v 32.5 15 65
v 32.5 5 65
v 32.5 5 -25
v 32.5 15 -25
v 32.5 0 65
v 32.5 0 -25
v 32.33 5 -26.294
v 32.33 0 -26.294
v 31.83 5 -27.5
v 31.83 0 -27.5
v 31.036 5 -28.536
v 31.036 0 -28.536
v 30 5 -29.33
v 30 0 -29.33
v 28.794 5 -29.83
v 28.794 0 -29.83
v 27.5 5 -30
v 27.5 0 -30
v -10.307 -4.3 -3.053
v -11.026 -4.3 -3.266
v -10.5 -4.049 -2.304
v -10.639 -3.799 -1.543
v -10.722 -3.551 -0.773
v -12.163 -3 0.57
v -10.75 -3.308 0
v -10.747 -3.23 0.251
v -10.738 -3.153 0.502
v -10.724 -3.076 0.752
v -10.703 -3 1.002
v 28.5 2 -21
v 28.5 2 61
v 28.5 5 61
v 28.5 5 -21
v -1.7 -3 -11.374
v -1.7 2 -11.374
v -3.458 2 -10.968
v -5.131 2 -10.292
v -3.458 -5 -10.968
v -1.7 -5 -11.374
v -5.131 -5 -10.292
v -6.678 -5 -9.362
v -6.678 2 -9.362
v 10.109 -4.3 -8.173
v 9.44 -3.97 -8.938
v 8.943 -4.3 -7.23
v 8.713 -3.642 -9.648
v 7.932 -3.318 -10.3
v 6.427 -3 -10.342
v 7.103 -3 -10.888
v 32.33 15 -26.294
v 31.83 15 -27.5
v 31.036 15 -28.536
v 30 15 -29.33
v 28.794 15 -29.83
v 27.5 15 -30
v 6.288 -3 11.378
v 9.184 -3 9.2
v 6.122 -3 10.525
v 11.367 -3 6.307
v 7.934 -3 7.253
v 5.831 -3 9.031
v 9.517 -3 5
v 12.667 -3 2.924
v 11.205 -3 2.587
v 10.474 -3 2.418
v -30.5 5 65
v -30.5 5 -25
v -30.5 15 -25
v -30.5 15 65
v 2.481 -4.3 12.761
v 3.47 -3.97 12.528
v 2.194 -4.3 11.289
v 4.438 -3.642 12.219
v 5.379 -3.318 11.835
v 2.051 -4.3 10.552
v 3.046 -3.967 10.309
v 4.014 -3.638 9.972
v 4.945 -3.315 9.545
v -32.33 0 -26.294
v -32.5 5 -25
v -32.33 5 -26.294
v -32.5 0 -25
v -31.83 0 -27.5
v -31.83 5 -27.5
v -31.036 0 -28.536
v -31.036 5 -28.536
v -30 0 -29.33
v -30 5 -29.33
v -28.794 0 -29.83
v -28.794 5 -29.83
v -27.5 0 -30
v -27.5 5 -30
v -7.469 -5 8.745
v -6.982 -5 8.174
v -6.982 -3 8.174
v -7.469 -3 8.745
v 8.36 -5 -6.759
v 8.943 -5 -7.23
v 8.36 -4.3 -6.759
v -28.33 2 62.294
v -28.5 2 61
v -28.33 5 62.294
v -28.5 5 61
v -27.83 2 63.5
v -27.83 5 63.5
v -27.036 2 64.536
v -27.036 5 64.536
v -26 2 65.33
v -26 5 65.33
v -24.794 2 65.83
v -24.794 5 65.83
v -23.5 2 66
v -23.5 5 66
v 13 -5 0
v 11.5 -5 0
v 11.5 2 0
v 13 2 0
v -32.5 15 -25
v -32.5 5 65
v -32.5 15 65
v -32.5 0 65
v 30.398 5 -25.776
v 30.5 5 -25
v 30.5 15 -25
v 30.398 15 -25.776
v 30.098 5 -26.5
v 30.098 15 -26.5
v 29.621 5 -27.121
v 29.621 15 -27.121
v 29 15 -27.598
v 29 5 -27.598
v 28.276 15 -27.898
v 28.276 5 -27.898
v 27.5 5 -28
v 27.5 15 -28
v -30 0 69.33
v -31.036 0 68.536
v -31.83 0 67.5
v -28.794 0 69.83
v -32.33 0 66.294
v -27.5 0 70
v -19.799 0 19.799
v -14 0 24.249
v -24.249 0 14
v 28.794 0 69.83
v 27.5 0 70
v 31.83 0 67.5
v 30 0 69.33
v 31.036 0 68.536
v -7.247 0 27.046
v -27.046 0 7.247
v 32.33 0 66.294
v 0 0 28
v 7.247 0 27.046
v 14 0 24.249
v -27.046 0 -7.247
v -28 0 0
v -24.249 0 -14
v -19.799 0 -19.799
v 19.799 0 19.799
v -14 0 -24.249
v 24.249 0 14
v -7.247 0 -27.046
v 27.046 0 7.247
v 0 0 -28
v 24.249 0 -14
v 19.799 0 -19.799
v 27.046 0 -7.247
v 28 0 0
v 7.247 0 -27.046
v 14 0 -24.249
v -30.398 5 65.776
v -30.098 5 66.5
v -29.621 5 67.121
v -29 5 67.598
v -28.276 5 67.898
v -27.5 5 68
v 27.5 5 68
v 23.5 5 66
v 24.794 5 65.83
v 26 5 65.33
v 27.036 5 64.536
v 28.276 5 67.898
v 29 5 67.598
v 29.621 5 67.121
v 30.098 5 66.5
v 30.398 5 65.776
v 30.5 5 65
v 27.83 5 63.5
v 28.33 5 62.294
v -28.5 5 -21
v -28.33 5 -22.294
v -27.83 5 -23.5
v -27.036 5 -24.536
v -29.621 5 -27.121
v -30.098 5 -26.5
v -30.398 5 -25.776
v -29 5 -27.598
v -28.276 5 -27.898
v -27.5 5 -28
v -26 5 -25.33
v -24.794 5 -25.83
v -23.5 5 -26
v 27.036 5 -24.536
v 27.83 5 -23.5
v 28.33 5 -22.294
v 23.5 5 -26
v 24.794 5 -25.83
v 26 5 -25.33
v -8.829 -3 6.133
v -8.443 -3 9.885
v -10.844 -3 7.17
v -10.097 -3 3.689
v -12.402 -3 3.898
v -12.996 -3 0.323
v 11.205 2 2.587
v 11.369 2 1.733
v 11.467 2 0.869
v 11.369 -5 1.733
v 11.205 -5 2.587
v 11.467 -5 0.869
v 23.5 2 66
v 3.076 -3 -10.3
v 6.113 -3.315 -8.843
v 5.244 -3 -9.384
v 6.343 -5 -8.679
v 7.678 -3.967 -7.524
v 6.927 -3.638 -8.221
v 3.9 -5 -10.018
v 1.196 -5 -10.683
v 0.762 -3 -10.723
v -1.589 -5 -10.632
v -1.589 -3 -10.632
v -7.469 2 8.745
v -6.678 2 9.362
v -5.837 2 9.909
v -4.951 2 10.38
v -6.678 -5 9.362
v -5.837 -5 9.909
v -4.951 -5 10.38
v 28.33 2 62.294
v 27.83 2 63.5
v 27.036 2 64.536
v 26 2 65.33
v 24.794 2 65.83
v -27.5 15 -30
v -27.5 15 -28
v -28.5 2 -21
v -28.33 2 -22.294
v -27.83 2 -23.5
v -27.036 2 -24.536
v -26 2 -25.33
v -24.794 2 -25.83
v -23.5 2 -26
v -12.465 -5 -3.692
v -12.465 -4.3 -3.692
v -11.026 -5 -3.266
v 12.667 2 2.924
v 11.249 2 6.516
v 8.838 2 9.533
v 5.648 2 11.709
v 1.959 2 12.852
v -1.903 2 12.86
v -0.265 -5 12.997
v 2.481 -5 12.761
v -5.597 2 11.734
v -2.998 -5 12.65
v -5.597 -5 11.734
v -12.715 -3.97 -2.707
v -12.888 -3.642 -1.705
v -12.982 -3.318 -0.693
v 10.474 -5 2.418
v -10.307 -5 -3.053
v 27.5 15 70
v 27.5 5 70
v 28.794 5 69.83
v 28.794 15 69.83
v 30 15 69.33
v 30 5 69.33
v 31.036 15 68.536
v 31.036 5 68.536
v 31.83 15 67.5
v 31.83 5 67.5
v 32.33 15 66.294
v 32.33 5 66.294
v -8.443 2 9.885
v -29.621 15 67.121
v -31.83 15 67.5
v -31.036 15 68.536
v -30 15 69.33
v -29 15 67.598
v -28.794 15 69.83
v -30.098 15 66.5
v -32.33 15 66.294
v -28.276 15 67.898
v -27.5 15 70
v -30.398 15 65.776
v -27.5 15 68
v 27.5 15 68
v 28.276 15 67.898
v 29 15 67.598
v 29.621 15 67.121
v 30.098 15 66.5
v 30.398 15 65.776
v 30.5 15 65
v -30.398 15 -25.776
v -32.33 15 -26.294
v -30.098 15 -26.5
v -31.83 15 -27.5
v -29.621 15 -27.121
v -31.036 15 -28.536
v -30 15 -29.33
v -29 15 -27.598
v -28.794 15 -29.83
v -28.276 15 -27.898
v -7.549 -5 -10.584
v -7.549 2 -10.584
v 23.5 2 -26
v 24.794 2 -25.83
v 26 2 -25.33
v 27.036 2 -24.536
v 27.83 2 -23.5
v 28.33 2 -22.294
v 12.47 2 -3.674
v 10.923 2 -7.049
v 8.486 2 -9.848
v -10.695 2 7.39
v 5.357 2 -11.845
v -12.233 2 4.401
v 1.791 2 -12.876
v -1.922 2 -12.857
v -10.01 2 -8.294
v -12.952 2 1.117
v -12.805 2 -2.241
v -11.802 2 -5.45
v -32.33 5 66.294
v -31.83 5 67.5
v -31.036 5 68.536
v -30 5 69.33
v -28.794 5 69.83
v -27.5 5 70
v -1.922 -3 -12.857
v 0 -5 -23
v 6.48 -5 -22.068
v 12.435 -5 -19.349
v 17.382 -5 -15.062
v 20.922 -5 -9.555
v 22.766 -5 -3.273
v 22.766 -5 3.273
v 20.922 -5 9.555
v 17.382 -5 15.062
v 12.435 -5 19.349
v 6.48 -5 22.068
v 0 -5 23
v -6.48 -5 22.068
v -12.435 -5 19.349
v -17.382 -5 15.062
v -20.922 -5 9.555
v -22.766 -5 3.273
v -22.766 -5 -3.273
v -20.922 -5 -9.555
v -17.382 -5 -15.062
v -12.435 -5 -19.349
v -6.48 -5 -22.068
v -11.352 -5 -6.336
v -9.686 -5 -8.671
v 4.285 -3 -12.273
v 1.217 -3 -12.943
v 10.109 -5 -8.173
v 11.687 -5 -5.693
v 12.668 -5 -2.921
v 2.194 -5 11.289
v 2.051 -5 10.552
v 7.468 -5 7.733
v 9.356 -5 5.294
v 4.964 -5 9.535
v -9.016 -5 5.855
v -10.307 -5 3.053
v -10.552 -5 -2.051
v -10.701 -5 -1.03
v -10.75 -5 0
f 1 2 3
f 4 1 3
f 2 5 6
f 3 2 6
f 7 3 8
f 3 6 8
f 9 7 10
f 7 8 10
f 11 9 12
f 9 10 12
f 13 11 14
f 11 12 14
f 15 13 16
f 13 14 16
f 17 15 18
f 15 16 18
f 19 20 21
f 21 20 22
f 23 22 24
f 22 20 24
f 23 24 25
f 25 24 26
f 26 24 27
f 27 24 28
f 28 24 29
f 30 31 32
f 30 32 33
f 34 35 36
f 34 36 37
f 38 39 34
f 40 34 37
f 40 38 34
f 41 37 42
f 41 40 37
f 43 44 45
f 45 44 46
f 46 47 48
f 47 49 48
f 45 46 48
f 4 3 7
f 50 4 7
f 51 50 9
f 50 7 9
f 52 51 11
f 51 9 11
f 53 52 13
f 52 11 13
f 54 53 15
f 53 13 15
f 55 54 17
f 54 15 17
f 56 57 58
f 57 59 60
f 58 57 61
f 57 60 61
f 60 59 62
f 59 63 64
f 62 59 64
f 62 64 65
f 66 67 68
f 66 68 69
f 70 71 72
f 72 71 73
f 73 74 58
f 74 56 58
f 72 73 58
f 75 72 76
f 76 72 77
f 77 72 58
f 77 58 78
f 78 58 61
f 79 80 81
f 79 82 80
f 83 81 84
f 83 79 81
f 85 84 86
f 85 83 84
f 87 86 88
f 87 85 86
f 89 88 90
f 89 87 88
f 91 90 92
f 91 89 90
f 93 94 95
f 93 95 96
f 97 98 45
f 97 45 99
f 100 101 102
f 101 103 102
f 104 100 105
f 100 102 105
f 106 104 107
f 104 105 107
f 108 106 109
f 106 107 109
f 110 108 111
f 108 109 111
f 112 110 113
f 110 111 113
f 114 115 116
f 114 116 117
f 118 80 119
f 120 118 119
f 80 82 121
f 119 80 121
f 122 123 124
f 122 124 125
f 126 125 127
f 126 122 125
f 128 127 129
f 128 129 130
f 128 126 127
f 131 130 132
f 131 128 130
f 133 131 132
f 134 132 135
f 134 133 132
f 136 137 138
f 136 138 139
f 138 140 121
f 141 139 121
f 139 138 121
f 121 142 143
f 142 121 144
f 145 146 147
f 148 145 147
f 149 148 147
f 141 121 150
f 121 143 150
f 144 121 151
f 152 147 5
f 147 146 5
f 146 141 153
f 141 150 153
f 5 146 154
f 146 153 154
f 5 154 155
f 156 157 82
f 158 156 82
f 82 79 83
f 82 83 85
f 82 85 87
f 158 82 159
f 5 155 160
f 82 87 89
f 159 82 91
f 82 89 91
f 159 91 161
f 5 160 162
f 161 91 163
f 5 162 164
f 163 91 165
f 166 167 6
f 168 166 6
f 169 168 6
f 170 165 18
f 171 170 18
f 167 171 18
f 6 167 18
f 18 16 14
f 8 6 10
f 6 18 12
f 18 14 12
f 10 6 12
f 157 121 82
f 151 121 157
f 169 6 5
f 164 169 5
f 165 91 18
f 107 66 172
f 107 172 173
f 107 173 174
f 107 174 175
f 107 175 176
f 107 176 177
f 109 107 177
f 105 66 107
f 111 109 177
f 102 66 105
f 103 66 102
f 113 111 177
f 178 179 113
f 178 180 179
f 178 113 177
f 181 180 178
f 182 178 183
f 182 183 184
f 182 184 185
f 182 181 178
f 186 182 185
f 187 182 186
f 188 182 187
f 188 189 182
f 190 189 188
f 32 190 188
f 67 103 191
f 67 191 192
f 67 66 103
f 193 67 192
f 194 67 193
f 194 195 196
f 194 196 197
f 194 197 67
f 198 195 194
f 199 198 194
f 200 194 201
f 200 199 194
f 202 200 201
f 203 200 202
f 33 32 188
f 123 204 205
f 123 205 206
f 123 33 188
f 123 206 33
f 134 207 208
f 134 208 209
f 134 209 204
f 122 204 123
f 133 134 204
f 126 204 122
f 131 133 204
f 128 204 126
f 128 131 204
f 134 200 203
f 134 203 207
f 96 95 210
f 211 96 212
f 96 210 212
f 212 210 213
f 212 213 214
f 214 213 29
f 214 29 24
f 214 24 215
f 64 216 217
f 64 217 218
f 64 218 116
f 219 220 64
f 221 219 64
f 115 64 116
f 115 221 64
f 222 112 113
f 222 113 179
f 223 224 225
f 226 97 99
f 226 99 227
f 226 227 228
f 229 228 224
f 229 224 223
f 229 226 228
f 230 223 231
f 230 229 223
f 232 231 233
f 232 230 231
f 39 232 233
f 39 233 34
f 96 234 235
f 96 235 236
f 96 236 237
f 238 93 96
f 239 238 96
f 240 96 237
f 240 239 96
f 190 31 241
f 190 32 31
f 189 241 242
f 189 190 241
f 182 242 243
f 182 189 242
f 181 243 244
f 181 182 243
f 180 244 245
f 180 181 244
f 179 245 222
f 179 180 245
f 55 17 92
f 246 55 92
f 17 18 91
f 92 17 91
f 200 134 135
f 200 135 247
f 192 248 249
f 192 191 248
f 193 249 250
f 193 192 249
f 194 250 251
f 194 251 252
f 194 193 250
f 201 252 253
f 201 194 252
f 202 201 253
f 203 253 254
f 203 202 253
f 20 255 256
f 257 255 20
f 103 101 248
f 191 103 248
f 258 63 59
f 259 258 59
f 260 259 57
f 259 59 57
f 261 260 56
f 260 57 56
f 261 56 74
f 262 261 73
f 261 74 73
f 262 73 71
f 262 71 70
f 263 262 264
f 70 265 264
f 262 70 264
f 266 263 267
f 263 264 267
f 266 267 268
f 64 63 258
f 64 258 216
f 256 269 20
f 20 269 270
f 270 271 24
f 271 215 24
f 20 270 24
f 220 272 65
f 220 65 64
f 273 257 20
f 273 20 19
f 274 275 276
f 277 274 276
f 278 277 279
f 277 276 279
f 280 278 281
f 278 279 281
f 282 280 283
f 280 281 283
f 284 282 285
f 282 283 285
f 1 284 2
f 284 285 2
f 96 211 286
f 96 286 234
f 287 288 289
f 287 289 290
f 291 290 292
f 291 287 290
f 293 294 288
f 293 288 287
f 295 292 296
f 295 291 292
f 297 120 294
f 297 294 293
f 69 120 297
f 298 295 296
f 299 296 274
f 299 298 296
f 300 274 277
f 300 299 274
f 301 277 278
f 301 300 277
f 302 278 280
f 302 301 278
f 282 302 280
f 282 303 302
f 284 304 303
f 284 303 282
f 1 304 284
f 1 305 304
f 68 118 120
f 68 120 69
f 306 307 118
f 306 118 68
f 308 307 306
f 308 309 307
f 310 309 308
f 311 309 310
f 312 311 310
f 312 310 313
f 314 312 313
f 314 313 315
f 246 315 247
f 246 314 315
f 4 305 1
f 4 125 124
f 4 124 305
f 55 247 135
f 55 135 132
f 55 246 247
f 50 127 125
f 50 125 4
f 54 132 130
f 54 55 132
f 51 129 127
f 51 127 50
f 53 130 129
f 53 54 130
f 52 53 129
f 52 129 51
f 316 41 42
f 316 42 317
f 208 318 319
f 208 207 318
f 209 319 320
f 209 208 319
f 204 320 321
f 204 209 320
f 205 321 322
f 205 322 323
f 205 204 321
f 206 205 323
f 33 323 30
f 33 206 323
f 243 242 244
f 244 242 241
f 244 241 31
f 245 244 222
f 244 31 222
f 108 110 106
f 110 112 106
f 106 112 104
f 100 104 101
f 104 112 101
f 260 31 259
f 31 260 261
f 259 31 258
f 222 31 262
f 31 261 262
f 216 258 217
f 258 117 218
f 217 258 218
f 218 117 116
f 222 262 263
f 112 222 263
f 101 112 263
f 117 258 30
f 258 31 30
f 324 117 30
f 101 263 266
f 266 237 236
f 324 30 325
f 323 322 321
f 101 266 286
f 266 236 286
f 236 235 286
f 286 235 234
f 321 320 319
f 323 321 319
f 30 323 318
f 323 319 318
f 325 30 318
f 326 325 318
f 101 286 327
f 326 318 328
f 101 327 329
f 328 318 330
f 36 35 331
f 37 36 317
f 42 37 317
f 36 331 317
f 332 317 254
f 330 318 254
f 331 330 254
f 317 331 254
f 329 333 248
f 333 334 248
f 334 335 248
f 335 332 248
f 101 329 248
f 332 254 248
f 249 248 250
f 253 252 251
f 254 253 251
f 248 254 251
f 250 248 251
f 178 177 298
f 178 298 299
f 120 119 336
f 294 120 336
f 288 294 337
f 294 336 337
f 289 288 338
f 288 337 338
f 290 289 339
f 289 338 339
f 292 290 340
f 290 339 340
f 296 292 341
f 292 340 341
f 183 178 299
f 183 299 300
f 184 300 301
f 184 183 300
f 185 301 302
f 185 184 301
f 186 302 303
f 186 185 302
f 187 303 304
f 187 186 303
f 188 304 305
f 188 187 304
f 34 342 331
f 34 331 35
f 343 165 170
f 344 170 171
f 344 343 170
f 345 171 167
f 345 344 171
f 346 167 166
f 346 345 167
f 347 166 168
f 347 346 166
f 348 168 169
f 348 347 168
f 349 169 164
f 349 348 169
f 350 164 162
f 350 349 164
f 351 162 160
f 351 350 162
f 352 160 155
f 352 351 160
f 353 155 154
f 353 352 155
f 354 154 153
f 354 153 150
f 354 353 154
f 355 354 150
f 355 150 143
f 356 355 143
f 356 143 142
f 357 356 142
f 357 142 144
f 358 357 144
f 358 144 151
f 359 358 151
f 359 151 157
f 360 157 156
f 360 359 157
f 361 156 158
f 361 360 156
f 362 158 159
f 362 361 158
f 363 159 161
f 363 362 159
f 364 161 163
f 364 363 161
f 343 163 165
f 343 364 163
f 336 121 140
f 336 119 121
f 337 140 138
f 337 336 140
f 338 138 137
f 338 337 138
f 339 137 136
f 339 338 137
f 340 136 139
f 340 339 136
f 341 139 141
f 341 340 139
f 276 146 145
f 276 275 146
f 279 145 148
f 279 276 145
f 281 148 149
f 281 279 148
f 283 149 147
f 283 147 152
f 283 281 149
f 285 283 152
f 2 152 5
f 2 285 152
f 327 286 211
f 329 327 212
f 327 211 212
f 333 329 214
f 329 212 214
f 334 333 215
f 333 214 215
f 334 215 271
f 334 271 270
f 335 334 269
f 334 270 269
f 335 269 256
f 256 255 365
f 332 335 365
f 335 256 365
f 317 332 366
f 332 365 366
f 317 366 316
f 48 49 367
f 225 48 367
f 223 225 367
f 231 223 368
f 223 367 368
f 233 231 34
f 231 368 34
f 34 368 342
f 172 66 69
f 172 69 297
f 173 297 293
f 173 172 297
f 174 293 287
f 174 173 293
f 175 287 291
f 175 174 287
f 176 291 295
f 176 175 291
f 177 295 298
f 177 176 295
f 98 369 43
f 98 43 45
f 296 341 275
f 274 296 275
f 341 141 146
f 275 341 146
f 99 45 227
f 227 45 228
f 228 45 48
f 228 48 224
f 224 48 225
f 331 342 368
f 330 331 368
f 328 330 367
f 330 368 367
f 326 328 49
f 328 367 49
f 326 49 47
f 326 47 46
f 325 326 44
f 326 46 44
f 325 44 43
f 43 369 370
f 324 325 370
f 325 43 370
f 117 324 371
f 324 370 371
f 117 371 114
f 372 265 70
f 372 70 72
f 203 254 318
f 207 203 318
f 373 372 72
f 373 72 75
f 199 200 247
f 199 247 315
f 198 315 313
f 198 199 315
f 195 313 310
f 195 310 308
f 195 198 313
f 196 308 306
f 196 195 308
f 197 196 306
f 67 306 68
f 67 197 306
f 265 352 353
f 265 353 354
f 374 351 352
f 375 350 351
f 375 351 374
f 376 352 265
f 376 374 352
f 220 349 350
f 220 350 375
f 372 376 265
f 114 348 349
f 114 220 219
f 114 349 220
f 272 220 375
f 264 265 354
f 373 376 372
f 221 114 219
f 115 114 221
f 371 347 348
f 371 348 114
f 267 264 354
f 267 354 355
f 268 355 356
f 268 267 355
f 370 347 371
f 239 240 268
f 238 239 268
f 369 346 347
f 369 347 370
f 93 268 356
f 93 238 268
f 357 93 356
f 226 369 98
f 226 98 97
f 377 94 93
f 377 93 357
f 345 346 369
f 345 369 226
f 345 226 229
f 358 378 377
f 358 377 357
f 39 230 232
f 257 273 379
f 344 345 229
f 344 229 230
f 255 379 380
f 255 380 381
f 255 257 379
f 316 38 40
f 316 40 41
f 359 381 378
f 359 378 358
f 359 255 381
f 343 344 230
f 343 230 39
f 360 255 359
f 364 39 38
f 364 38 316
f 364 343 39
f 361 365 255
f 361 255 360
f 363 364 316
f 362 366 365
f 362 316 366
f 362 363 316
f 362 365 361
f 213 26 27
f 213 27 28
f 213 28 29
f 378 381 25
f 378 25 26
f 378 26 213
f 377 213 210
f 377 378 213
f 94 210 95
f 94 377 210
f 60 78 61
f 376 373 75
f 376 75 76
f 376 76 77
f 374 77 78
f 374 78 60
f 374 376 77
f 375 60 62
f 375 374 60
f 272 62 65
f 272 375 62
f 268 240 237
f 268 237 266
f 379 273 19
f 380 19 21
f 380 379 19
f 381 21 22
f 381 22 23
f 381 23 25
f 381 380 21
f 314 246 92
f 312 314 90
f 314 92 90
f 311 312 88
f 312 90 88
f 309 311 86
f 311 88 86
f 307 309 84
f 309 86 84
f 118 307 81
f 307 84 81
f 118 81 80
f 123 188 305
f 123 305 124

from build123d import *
from OCP.BRepFilletAPI import BRepFilletAPI_MakeChamfer

# Parameters (mm, degrees)
SKETCH1_W           = 65
SKETCH1_H           = 100
BOSS_EXTRUDE1_DEPTH = 2
SKETCH2_W           = 65
SKETCH2_H           = 100
SKETCH2_W_2         = 57
SKETCH2_H_2         = 92
BOSS_EXTRUDE2_DEPTH = 3
FILLET1_R           = 5
BOSS_EXTRUDE3_DEPTH = 10
SKETCH6_R           = 18
BOSS_EXTRUDE4_DEPTH = 5
CHAMFER1_SIZE       = 10
SKETCH7_R           = 13
CUT_EXTRUDE1_DEPTH  = 80.726093596
BOSS_EXTRUDE6_DEPTH = 2
BOSS_EXTRUDE7_DEPTH = 7
CHAMFER2_SIZE       = 1.3
CHAMFER2_SIZE2      = 4.000988598


with BuildPart() as part:
    # Sketch1 → Boss-Extrude1 (new body)
    with BuildSketch(Plane(origin=(0, 0, 0), x_dir=(1, 0, 0), z_dir=(0, 1, 0))):
        with Locations((0, -20)):
            Rectangle(SKETCH1_W, SKETCH1_H)
    extrude(amount=BOSS_EXTRUDE1_DEPTH)

    # Sketch2 → Boss-Extrude2 (add)
    with BuildSketch(Plane(origin=(0, 2, 0), x_dir=(1, 0, 0), z_dir=(0, 1, 0))):
        with Locations((0, -20)):
            Rectangle(SKETCH2_W, SKETCH2_H)
        with Locations((0, -20)):
            Rectangle(SKETCH2_W_2, SKETCH2_H_2, mode=Mode.SUBTRACT)
    extrude(amount=BOSS_EXTRUDE2_DEPTH)

    # Fillet1
    fillet1_edges = [part.edges().sort_by_distance(p)[0] for p in [
        (-28.5, 3.5, 66),
        (28.5, 3.5, 66),
        (28.5, 3.5, -26),
        (-28.5, 3.5, -26),
        (-32.5, 2.5, -30),
        (32.5, 2.5, -30),
        (32.5, 2.5, 70),
        (-32.5, 2.5, 70),
    ]]
    fillet(fillet1_edges, radius=FILLET1_R)

    # Sketch4 → Boss-Extrude3 (add)
    with BuildSketch(Plane(origin=(0, 5, 0), x_dir=(1, 0, 0), z_dir=(0, 1, 0))):
        with BuildLine():
            Line((-32.5, 25), (-32.5, -65))
            ThreePointArc((-32.5, -65), (-31.035533906, -68.535533906), (-27.5, -70))
            Line((-27.5, -70), (27.5, -70))
            ThreePointArc((27.5, -70), (31.035533906, -68.535533906), (32.5, -65))
            Line((32.5, -65), (32.5, 25))
            ThreePointArc((32.5, 25), (31.035533906, 28.535533906), (27.5, 30))
            Line((27.5, 30), (-27.5, 30))
            ThreePointArc((-27.5, 30), (-31.035533906, 28.535533906), (-32.5, 25))
        make_face()
        with BuildLine():
            Line((-30.5, 25), (-30.5, -65))
            ThreePointArc((-30.5, -65), (-29.621320344, -67.121320344), (-27.5, -68))
            Line((-27.5, -68), (27.5, -68))
            ThreePointArc((27.5, -68), (29.621320344, -67.121320344), (30.5, -65))
            Line((30.5, -65), (30.5, 25))
            ThreePointArc((30.5, 25), (29.621320344, 27.121320344), (27.5, 28))
            Line((27.5, 28), (-27.5, 28))
            ThreePointArc((-27.5, 28), (-29.621320344, 27.121320344), (-30.5, 25))
        make_face(mode=Mode.SUBTRACT)
    extrude(amount=BOSS_EXTRUDE3_DEPTH)

    # Sketch6 → Boss-Extrude4 (add)
    with BuildSketch(Plane(origin=(0, -5, 0), x_dir=(-1, 0, 0), z_dir=(0, -1, 0))):
        with Locations(Location((0, 0, 0), (0, 0, 90))):
            Circle(SKETCH6_R)
    extrude(amount=-BOSS_EXTRUDE4_DEPTH)

    # Chamfer1
    # the kernel refuses this chamfer: 10 mm, written as the material it adds along each edge
    with BuildSketch(Plane(origin=(0, 0, 0), x_dir=(0, 0, -1), z_dir=(-1, 0, 0))) as chamfer1_piece_1_section:
        Polygon((18 + CHAMFER1_SIZE, 0), (18, CHAMFER1_SIZE), (18, 0), align=None)
    chamfer1_piece_1 = revolve(axis=Axis((0, 0, 0), (0, -1, 0)), mode=Mode.PRIVATE)
    chamfer1_piece_1 = split(chamfer1_piece_1, bisect_by=Plane(origin=(0, -5, 25.515578953), z_dir=(0, 1, 0)), keep=Keep.TOP, mode=Mode.PRIVATE)
    add(chamfer1_piece_1)

    # Sketch7 → Cut-Extrude1 (cut, through all)
    with BuildSketch(Plane.XZ.offset(5)):
        with Locations(Location((0, 0, 0), (0, 0, 270))):
            Circle(SKETCH7_R)
    extrude(amount=-CUT_EXTRUDE1_DEPTH, mode=Mode.SUBTRACT)

    # Sketch8 → Boss-Extrude6 (add)
    with BuildSketch(Plane(origin=(0, -5, 0), x_dir=(-1, 0, 0), z_dir=(0, -1, 0))):
        with BuildLine():
            ThreePointArc((-8.942785339, 7.230255208), (-4.172190868, 10.71647439), (1.699808228, 11.373682429))
            Line((1.699808228, 11.373682429), (1.921522345, 12.857206224))
            ThreePointArc((1.921522345, 12.857206224), (-4.716389677, 12.114275398), (-10.109235601, 8.173331975))
            Line((-10.109235601, 8.173331975), (-8.942785339, 7.230255208))
        make_face()
        with BuildLine():
            Line((1.921522345, 12.857206224), (1.699808228, 11.373682429))
            ThreePointArc((1.699808228, 11.373682429), (4.307975824, 10.662614328), (6.678083991, 9.362328461))
            Line((6.678083991, 9.362328461), (7.549138424, 10.583501739))
            ThreePointArc((7.549138424, 10.583501739), (4.869885714, 12.053390109), (1.921522345, 12.857206224))
        make_face()
        with BuildLine():
            Line((12.464656553, 3.692199481), (11.026426951, 3.266176464))
            ThreePointArc((11.026426951, 3.266176464), (11.380990948, 1.650165153), (11.5, 0))
            ThreePointArc((11.5, 0), (10.443646499, -4.814586982), (7.468652556, -8.744668604))
            Line((7.468652556, -8.744668604), (8.442824628, -9.885277553))
            ThreePointArc((8.442824628, -9.885277553), (11.80586126, -5.442576588), (13, 0))
            ThreePointArc((13, 0), (12.865468029, 1.865404086), (12.464656553, 3.692199481))
        make_face()
        with BuildLine():
            ThreePointArc((7.468652556, -8.744668604), (6.263348903, -9.644711531), (4.950877613, -10.37973077))
            Line((4.950877613, -10.37973077), (5.596644259, -11.733608697))
            ThreePointArc((5.596644259, -11.733608697), (7.080307455, -10.902717383), (8.442824628, -9.885277553))
            Line((8.442824628, -9.885277553), (7.468652556, -8.744668604))
        make_face()
        with BuildLine():
            ThreePointArc((-8.359560208, 6.758716825), (-3.900091464, 10.017573887), (1.58895117, 10.631920531))
            Line((1.58895117, 10.631920531), (1.699808228, 11.373682429))
            ThreePointArc((1.699808228, 11.373682429), (-4.172190868, 10.71647439), (-8.942785339, 7.230255208))
            Line((-8.942785339, 7.230255208), (-8.359560208, 6.758716825))
        make_face()
        with BuildLine():
            Line((11.026426951, 3.266176464), (10.30731215, 3.053164956))
            ThreePointArc((10.30731215, 3.053164956), (10.638752408, 1.542545686), (10.75, 0))
            ThreePointArc((10.75, 0), (9.762539119, -4.500592179), (6.98156652, -8.17436413))
            Line((6.98156652, -8.17436413), (7.468652556, -8.744668604))
            ThreePointArc((7.468652556, -8.744668604), (10.443646499, -4.814586982), (11.5, 0))
            ThreePointArc((11.5, 0), (11.380990948, 1.650165153), (11.026426951, 3.266176464))
        make_face()
        with BuildLine():
            Line((-2.48051694, -12.761153385), (-2.194303447, -11.28871261))
            ThreePointArc((-2.194303447, -11.28871261), (-7.98857126, -8.272407704), (-11.205255745, -2.586937125))
            Line((-11.205255745, -2.586937125), (-12.666810842, -2.924363706))
            ThreePointArc((-12.666810842, -2.924363706), (-9.030558816, -9.351417404), (-2.48051694, -12.761153385))
        make_face()
        with BuildLine():
            Line((-2.194303447, -11.28871261), (-2.0511967, -10.552492222))
            ThreePointArc((-2.0511967, -10.552492222), (-7.467577482, -7.732902854), (-10.474478196, -2.418223834))
            Line((-10.474478196, -2.418223834), (-11.205255745, -2.586937125))
            ThreePointArc((-11.205255745, -2.586937125), (-7.98857126, -8.272407704), (-2.194303447, -11.28871261))
        make_face()
        with BuildLine():
            ThreePointArc((-11.205255745, -2.586937125), (-11.42607634, -1.301836958), (-11.5, 0))
            Line((-11.5, 0), (-13, 0))
            ThreePointArc((-13, 0), (-12.916434124, -1.471641779), (-12.666810842, -2.924363706))
            Line((-12.666810842, -2.924363706), (-11.205255745, -2.586937125))
        make_face()
    extrude(amount=-BOSS_EXTRUDE6_DEPTH)

    # Sketch8<5> → Boss-Extrude7 (add)
    with BuildSketch(Plane(origin=(0, -5, 0), x_dir=(-1, 0, 0), z_dir=(0, -1, 0))):
        with BuildLine():
            Line((1.921522345, 12.857206224), (1.699808228, 11.373682429))
            ThreePointArc((1.699808228, 11.373682429), (4.307975824, 10.662614328), (6.678083991, 9.362328461))
            Line((6.678083991, 9.362328461), (7.549138424, 10.583501739))
            ThreePointArc((7.549138424, 10.583501739), (4.869885714, 12.053390109), (1.921522345, 12.857206224))
        make_face()
        with BuildLine():
            ThreePointArc((7.468652556, -8.744668604), (6.263348903, -9.644711531), (4.950877613, -10.37973077))
            Line((4.950877613, -10.37973077), (5.596644259, -11.733608697))
            ThreePointArc((5.596644259, -11.733608697), (7.080307455, -10.902717383), (8.442824628, -9.885277553))
            Line((8.442824628, -9.885277553), (7.468652556, -8.744668604))
        make_face()
        with BuildLine():
            ThreePointArc((-11.205255745, -2.586937125), (-11.42607634, -1.301836958), (-11.5, 0))
            Line((-11.5, 0), (-13, 0))
            ThreePointArc((-13, 0), (-12.916434124, -1.471641779), (-12.666810842, -2.924363706))
            Line((-12.666810842, -2.924363706), (-11.205255745, -2.586937125))
        make_face()
    extrude(amount=-BOSS_EXTRUDE7_DEPTH)

    # Chamfer2: one chamfer whose edges measure the first distance from different faces: ONE call of the kernel's chamfer builder (chamfer() names one face for all edges)
    chamfer2_edges_1 = [part.edges().sort_by_distance(p)[0] for p in [
        (9.234397905, -3, -7.4660244),
    ]]
    chamfer2_side_1 = [part.faces().sort_by_distance(p)[0] for p in [
        (9.234397905, -4, -7.4660244),
    ]]
    chamfer2_edges_2 = [part.edges().sort_by_distance(p)[0] for p in [
        (-11.385984352, -3, -3.372682218),
    ]]
    chamfer2_side_2 = [part.faces().sort_by_distance(p)[0] for p in [
        (-11.385984352, -4, -3.372682218),
    ]]
    chamfer2_edges_3 = [part.edges().sort_by_distance(p)[0] for p in [
        (2.26585682, -3, 11.656822803),
    ]]
    chamfer2_side_3 = [part.faces().sort_by_distance(p)[0] for p in [
        (2.26585682, -4, 11.656822803),
    ]]
    chamfer2 = BRepFilletAPI_MakeChamfer(part.part.solid().wrapped)
    for e in chamfer2_edges_1:
        chamfer2.Add(CHAMFER2_SIZE, CHAMFER2_SIZE2, e.wrapped, chamfer2_side_1[0].wrapped)  # the first distance lies on this face
    for e in chamfer2_edges_2:
        chamfer2.Add(CHAMFER2_SIZE, CHAMFER2_SIZE2, e.wrapped, chamfer2_side_2[0].wrapped)  # the first distance lies on this face
    for e in chamfer2_edges_3:
        chamfer2.Add(CHAMFER2_SIZE, CHAMFER2_SIZE2, e.wrapped, chamfer2_side_3[0].wrapped)  # the first distance lies on this face
    add(Compound.cast(chamfer2.Shape()), mode=Mode.REPLACE)


solid = part.part
